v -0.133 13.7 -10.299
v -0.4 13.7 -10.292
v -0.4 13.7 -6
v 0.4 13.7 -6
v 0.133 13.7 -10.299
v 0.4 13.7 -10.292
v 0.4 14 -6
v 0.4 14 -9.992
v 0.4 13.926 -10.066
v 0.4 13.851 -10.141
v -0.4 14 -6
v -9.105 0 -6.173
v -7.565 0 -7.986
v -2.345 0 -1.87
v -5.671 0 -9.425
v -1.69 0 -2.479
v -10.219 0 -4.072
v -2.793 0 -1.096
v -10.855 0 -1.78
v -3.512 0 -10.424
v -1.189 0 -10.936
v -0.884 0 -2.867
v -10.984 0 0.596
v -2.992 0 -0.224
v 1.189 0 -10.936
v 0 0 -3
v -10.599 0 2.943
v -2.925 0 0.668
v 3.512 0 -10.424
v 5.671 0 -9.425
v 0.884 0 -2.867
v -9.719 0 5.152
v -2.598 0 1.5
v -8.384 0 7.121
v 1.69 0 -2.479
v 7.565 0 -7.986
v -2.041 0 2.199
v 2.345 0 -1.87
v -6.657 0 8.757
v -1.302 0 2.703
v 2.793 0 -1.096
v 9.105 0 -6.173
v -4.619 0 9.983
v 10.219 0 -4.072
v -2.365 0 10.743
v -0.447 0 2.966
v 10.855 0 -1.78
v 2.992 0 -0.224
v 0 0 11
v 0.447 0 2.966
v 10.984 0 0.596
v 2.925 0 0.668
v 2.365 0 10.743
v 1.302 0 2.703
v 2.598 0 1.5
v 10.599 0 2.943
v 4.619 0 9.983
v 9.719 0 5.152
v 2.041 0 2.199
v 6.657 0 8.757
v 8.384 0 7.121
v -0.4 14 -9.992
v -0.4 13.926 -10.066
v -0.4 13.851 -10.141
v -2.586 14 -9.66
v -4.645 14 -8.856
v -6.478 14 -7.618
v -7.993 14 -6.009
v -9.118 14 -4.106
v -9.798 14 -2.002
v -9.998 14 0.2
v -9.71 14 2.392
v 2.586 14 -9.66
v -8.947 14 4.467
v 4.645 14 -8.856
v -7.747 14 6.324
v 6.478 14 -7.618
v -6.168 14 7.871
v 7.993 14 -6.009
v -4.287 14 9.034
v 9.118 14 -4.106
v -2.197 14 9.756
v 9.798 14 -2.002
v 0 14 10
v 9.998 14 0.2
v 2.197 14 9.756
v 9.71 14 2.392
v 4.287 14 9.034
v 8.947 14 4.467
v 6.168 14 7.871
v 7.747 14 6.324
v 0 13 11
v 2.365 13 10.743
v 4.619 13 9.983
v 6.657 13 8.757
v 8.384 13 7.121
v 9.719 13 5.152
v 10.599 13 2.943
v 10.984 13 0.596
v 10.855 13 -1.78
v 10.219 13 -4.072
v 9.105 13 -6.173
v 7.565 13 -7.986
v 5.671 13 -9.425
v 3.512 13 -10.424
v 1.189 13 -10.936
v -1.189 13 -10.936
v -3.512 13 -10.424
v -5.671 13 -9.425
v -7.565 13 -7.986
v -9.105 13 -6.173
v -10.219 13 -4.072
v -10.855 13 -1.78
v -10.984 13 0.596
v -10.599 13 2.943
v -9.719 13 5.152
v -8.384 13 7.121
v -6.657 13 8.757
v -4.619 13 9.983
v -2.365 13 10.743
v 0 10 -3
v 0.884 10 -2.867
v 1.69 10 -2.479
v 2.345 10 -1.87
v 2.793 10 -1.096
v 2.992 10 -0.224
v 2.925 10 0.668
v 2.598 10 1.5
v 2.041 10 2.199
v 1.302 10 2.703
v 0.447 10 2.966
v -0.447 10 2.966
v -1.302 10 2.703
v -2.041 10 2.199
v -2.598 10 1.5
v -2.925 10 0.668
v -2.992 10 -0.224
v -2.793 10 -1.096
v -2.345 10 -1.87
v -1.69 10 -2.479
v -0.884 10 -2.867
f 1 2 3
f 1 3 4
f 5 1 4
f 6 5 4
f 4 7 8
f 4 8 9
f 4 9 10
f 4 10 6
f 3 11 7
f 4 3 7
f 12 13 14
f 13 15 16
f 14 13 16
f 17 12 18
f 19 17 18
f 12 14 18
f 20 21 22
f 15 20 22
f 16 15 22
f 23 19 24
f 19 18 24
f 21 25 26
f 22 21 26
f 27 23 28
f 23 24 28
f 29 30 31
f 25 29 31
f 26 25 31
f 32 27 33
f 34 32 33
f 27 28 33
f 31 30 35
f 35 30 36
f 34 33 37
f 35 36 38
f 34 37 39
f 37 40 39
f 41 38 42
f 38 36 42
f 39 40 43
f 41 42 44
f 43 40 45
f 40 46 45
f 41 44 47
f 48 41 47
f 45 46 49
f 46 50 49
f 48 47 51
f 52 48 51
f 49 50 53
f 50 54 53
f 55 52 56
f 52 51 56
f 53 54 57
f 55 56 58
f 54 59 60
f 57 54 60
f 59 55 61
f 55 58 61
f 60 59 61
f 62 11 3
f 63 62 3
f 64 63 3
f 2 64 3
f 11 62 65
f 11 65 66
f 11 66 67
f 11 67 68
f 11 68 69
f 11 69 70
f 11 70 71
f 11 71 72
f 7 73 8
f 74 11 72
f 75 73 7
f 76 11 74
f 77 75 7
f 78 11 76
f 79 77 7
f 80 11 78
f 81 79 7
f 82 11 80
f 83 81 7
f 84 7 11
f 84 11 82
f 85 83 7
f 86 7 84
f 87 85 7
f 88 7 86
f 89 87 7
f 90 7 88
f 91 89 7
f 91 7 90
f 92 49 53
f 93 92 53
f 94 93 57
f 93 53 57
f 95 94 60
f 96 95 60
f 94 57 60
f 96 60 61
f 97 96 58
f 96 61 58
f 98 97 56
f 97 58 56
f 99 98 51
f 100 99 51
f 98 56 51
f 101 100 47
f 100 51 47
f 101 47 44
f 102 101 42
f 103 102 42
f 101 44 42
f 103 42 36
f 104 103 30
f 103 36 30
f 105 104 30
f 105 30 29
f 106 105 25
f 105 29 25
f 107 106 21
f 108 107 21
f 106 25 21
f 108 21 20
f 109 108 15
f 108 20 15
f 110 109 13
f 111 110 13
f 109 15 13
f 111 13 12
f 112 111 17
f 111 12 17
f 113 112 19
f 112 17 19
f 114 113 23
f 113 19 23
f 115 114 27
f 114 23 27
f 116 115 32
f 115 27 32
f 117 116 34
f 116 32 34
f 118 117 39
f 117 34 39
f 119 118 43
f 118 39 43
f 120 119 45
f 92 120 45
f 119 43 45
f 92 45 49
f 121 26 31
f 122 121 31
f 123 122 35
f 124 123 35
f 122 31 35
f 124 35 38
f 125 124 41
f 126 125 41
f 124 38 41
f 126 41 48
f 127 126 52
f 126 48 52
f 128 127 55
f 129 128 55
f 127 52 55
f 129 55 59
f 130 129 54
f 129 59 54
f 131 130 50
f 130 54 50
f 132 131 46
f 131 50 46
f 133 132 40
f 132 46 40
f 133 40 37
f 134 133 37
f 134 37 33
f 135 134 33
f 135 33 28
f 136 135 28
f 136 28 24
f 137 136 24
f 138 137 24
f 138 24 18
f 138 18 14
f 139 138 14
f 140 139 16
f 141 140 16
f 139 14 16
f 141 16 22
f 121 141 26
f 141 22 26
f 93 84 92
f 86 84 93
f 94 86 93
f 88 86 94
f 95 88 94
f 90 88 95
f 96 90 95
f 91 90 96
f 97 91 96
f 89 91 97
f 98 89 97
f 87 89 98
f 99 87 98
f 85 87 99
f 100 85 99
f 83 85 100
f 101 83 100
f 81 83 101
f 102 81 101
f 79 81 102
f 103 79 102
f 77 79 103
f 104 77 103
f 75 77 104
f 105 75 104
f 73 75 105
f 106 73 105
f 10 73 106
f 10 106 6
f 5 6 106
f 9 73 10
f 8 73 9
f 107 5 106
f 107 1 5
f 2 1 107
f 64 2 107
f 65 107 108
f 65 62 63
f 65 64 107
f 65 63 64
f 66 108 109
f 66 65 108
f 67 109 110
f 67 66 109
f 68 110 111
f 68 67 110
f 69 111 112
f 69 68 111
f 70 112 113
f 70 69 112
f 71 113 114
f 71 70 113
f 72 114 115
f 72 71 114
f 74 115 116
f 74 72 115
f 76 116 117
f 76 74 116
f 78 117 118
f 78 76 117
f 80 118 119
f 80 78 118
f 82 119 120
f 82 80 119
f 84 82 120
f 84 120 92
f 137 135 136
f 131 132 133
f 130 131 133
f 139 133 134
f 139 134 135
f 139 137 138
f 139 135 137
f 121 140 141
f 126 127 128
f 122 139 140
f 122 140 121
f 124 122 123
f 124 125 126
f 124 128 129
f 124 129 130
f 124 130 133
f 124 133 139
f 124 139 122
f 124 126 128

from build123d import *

# Parameters (mm, degrees)
SKETCH1_R           = 11
BOSS_EXTRUDE1_DEPTH = 14
CHAMFER1_SIZE       = 1
SKETCH3_W           = 0.8
SKETCH3_H           = 5
CUT_EXTRUDE1_DEPTH  = 0.3
SKETCH4_R           = 3
CUT_EXTRUDE2_DEPTH  = 10


with BuildPart() as part:
    # Sketch1 → Boss-Extrude1 (new body)
    with BuildSketch(Plane(origin=(0, 0, 0), x_dir=(1, 0, 0), z_dir=(0, 1, 0))):
        with Locations(Location((0, 0, 0), (0, 0, 270))):
            Circle(SKETCH1_R)
    extrude(amount=BOSS_EXTRUDE1_DEPTH)

    # Chamfer1
    chamfer1_edges = [part.edges().sort_by_distance(p)[0] for p in [
        (0, 14, -11),
    ]]
    chamfer(chamfer1_edges, length=CHAMFER1_SIZE)

    # Sketch3 → Cut-Extrude1 (cut)
    with BuildSketch(Plane(origin=(0, 14, 0), x_dir=(1, 0, 0), z_dir=(0, 1, 0))):
        with Locations((0, 8.5)):
            Rectangle(SKETCH3_W, SKETCH3_H)
    extrude(amount=-CUT_EXTRUDE1_DEPTH, mode=Mode.SUBTRACT)

    # Sketch4 → Cut-Extrude2 (cut)
    with BuildSketch(Plane.XZ):
        with Locations(Location((0, 0, 0), (0, 0, 270))):
            Circle(SKETCH4_R)
    extrude(amount=-CUT_EXTRUDE2_DEPTH, mode=Mode.SUBTRACT)


solid = part.part
